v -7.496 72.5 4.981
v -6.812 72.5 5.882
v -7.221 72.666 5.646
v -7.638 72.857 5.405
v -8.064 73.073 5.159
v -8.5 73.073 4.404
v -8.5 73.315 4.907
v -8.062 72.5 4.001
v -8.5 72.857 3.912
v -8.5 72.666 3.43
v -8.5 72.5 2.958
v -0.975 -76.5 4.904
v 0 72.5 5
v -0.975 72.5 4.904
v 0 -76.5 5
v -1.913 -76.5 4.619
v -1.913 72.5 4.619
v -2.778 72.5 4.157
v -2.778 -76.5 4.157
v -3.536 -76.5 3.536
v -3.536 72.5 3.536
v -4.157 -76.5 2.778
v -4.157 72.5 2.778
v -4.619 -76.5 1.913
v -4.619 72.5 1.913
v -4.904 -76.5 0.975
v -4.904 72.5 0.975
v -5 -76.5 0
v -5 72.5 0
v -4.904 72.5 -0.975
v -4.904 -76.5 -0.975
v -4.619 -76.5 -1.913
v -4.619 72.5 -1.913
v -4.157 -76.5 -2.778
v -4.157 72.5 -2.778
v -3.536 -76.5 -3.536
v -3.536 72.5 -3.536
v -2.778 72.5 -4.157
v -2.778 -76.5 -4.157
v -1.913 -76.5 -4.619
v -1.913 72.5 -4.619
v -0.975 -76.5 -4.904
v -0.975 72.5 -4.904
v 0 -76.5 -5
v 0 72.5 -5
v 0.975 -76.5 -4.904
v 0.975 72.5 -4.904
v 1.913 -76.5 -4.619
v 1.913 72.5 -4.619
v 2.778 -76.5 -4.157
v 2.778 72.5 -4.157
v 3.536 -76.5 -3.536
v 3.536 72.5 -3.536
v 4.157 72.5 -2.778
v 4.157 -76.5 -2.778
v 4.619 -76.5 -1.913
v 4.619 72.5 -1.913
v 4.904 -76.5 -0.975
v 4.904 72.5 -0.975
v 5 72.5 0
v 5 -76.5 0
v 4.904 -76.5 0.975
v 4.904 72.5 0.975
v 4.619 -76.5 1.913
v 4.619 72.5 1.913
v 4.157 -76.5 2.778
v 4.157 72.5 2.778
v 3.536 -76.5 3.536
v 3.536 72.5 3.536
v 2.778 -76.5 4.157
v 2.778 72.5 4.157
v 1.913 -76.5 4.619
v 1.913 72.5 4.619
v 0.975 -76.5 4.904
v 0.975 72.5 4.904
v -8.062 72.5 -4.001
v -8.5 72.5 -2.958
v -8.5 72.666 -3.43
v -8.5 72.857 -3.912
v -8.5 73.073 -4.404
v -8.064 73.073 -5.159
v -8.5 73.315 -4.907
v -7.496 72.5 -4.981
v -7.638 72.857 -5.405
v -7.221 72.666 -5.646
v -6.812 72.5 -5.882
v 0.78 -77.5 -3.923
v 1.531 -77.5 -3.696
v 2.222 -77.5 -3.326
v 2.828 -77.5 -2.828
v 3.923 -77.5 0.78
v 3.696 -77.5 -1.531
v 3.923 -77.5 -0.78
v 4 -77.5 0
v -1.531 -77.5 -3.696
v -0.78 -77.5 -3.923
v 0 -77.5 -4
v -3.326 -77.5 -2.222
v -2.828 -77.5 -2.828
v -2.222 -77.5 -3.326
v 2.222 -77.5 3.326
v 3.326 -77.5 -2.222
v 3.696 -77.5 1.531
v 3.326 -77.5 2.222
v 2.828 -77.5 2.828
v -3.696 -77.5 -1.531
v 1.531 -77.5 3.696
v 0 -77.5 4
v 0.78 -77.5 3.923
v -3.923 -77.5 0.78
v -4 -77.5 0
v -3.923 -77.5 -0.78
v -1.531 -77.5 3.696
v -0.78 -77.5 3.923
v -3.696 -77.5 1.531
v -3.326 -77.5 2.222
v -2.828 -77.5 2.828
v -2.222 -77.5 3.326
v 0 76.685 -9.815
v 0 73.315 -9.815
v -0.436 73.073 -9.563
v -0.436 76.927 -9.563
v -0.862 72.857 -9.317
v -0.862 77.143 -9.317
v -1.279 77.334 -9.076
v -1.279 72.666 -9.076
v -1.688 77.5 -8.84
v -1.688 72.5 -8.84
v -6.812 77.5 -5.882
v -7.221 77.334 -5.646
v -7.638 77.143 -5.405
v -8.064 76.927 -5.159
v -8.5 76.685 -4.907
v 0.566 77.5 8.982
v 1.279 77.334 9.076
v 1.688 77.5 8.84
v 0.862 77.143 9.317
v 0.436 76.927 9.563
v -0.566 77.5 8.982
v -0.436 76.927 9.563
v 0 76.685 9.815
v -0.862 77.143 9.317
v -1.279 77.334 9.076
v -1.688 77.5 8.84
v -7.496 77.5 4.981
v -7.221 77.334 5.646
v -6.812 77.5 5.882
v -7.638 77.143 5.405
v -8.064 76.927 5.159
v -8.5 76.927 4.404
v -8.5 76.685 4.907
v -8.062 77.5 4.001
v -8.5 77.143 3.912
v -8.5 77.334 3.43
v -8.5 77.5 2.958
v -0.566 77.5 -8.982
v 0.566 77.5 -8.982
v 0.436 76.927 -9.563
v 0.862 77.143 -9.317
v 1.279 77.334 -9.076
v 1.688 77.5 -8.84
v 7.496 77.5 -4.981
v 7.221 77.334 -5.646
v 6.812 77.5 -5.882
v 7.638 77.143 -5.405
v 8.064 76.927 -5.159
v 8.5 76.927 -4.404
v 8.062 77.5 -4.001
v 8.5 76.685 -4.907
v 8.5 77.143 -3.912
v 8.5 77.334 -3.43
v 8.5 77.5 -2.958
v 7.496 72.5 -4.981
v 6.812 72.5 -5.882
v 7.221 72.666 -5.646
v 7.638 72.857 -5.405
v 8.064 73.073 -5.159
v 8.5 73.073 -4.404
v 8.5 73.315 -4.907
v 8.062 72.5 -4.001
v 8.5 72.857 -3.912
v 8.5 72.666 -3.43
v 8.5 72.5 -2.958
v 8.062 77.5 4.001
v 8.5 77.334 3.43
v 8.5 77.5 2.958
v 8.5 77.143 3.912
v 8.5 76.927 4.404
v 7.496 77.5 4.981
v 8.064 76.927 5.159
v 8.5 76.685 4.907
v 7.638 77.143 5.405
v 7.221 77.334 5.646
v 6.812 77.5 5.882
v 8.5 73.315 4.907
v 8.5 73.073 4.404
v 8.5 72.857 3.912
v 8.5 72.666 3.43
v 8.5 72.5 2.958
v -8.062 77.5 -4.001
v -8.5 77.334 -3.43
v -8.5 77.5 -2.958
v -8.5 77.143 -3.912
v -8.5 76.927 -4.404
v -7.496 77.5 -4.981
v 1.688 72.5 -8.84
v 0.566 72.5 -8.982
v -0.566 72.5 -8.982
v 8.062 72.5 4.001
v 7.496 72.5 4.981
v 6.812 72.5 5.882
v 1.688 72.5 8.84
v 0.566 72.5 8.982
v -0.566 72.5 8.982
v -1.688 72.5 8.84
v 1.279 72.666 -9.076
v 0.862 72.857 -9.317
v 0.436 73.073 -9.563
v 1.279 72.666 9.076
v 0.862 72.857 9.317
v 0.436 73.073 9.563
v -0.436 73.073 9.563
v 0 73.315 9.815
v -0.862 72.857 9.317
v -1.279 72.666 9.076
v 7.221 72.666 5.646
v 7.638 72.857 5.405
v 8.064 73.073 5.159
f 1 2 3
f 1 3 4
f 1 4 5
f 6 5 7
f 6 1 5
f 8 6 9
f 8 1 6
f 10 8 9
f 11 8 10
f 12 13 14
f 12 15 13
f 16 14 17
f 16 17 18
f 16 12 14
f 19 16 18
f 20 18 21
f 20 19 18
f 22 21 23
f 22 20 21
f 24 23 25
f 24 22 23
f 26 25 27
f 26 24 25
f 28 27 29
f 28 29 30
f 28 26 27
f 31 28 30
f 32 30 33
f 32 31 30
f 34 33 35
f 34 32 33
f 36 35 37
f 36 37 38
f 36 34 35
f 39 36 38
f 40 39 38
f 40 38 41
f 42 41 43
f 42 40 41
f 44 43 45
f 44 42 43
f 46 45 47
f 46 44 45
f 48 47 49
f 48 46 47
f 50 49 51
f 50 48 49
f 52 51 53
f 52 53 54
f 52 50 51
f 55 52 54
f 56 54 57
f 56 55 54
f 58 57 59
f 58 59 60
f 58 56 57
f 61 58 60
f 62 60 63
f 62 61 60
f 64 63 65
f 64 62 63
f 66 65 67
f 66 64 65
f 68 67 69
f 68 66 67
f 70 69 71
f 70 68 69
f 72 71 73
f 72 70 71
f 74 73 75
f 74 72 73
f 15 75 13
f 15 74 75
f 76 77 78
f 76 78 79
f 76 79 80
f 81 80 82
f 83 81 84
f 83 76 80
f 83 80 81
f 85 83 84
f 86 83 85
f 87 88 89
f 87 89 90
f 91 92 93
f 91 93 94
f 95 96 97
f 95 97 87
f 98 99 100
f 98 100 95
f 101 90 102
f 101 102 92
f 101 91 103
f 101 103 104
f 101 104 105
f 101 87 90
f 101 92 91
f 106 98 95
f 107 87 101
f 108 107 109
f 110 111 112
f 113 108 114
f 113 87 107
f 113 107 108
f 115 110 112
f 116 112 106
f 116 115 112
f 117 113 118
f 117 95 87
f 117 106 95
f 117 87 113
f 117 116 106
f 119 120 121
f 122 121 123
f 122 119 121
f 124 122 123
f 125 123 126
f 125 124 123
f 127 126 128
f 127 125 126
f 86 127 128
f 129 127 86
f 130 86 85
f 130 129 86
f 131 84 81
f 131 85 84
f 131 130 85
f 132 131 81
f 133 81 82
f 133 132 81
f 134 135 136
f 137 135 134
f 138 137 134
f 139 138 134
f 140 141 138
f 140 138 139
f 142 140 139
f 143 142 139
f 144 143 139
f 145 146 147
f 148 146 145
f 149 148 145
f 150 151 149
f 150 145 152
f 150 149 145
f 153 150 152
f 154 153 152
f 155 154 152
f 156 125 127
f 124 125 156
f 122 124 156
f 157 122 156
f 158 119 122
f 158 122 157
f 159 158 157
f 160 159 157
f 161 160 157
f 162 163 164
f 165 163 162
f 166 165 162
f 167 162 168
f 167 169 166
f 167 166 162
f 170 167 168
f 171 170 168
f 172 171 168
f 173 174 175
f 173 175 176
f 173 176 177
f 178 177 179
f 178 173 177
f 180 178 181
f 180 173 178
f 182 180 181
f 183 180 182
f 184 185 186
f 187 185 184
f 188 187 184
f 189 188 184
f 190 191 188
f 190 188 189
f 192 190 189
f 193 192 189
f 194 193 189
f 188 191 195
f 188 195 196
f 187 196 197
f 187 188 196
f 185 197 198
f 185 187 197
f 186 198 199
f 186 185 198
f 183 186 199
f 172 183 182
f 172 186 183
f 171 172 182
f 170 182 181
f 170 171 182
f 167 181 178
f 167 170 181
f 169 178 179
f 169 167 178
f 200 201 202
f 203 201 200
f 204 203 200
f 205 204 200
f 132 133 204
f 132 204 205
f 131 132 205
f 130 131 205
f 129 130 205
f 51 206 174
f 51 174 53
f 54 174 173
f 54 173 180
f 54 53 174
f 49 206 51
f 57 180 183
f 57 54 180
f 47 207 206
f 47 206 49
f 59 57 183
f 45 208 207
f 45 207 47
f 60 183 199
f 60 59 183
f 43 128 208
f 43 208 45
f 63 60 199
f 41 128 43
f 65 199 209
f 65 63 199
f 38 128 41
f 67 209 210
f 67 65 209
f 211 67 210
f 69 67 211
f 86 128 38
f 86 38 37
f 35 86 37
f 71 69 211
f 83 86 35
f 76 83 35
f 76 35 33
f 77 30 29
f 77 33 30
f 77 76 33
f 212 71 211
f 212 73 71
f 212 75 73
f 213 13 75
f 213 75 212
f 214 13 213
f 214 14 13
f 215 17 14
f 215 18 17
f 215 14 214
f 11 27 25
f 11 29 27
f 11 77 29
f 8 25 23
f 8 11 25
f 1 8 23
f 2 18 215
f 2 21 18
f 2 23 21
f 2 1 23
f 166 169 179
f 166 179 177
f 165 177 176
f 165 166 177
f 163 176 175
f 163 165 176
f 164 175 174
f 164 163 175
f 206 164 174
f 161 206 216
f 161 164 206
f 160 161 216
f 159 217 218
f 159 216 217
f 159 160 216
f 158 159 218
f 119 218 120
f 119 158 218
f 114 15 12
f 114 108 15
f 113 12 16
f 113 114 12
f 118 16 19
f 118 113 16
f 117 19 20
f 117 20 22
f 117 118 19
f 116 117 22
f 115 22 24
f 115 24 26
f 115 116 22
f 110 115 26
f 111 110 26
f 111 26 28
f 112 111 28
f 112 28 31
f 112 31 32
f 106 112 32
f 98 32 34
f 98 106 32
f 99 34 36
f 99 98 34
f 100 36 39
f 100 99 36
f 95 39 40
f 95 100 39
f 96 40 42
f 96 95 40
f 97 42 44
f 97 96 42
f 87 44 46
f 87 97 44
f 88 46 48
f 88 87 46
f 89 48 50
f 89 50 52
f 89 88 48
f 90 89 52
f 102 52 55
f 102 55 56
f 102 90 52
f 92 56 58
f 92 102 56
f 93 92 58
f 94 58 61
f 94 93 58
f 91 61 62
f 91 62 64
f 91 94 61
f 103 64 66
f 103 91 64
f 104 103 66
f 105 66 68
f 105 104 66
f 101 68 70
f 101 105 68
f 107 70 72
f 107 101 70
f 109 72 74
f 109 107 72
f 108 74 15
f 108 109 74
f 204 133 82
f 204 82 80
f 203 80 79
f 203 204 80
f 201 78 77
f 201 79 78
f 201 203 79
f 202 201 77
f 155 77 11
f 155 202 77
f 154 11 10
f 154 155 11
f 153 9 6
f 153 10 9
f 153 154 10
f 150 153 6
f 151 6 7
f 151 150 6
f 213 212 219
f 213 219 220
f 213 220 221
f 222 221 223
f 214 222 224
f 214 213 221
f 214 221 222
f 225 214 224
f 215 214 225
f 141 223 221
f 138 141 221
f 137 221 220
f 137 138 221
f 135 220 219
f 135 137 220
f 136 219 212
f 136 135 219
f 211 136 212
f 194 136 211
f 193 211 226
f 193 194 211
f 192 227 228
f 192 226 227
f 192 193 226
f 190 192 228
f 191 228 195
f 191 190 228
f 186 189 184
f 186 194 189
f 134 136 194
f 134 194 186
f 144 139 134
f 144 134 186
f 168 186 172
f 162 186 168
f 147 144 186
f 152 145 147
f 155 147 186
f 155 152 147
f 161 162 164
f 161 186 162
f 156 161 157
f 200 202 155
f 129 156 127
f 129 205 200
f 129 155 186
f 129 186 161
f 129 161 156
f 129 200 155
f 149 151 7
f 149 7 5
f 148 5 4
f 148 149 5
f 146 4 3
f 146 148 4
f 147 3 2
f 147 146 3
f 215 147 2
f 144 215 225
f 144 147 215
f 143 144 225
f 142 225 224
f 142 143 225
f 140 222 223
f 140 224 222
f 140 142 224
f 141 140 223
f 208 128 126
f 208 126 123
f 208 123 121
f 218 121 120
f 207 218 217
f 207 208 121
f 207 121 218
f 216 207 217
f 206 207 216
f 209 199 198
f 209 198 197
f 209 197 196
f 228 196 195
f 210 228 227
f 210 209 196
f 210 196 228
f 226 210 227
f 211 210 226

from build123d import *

# Parameters (mm, degrees)
CUT_EXTRUDE1_REACH = 157.644
SKETCH3_R          = 15.443252693


with BuildPart() as part:
    # Sketch2 → Revolve1 (revolve)
    with BuildSketch(Plane(origin=(0, 0, 0), x_dir=(0, 0, -1), z_dir=(1, 0, 0))):
        Polygon((-10, 76.5), (-10, 73.5), (-9, 72.5), (-5, 72.5), (-5, -76.5), (-4, -77.5), (0, -77.5), (0, 77.5), (-9, 77.5), align=None)
    revolve(axis=Axis((0, 23.60486684, 0), (0, -1, 0)))

    # Cut-Extrude1: up to this face of the body (flat: up to its plane)
    cut_extrude1_end = Plane(part.part.faces().sort_by_distance((0, 72.5, -8.745441559))[0])
    # Sketch3 → Cut-Extrude1 (cut, up to the picked face)
    with BuildSketch(Plane(origin=(0, 77.5, 0), x_dir=(1, 0, 0), z_dir=(0, 1, 0)), mode=Mode.PRIVATE) as cut_extrude1_sk1:
        Circle(SKETCH3_R)
        Polygon((0, -9.814954576), (8.5, -4.907477288), (8.5, 4.907477288), (0, 9.814954576), (-8.5, 4.907477288), (-8.5, -4.907477288), align=None, mode=Mode.SUBTRACT)
    cut_extrude1_tool1 = split(extrude(cut_extrude1_sk1.sketch, amount=-CUT_EXTRUDE1_REACH, mode=Mode.PRIVATE), bisect_by=cut_extrude1_end, keep=Keep.BOTH, mode=Mode.PRIVATE)
    add(cut_extrude1_tool1.solids().sort_by(Axis((-15.006452, 77.5, 0), (0, -1, 0)))[0], mode=Mode.SUBTRACT)


solid = part.part
